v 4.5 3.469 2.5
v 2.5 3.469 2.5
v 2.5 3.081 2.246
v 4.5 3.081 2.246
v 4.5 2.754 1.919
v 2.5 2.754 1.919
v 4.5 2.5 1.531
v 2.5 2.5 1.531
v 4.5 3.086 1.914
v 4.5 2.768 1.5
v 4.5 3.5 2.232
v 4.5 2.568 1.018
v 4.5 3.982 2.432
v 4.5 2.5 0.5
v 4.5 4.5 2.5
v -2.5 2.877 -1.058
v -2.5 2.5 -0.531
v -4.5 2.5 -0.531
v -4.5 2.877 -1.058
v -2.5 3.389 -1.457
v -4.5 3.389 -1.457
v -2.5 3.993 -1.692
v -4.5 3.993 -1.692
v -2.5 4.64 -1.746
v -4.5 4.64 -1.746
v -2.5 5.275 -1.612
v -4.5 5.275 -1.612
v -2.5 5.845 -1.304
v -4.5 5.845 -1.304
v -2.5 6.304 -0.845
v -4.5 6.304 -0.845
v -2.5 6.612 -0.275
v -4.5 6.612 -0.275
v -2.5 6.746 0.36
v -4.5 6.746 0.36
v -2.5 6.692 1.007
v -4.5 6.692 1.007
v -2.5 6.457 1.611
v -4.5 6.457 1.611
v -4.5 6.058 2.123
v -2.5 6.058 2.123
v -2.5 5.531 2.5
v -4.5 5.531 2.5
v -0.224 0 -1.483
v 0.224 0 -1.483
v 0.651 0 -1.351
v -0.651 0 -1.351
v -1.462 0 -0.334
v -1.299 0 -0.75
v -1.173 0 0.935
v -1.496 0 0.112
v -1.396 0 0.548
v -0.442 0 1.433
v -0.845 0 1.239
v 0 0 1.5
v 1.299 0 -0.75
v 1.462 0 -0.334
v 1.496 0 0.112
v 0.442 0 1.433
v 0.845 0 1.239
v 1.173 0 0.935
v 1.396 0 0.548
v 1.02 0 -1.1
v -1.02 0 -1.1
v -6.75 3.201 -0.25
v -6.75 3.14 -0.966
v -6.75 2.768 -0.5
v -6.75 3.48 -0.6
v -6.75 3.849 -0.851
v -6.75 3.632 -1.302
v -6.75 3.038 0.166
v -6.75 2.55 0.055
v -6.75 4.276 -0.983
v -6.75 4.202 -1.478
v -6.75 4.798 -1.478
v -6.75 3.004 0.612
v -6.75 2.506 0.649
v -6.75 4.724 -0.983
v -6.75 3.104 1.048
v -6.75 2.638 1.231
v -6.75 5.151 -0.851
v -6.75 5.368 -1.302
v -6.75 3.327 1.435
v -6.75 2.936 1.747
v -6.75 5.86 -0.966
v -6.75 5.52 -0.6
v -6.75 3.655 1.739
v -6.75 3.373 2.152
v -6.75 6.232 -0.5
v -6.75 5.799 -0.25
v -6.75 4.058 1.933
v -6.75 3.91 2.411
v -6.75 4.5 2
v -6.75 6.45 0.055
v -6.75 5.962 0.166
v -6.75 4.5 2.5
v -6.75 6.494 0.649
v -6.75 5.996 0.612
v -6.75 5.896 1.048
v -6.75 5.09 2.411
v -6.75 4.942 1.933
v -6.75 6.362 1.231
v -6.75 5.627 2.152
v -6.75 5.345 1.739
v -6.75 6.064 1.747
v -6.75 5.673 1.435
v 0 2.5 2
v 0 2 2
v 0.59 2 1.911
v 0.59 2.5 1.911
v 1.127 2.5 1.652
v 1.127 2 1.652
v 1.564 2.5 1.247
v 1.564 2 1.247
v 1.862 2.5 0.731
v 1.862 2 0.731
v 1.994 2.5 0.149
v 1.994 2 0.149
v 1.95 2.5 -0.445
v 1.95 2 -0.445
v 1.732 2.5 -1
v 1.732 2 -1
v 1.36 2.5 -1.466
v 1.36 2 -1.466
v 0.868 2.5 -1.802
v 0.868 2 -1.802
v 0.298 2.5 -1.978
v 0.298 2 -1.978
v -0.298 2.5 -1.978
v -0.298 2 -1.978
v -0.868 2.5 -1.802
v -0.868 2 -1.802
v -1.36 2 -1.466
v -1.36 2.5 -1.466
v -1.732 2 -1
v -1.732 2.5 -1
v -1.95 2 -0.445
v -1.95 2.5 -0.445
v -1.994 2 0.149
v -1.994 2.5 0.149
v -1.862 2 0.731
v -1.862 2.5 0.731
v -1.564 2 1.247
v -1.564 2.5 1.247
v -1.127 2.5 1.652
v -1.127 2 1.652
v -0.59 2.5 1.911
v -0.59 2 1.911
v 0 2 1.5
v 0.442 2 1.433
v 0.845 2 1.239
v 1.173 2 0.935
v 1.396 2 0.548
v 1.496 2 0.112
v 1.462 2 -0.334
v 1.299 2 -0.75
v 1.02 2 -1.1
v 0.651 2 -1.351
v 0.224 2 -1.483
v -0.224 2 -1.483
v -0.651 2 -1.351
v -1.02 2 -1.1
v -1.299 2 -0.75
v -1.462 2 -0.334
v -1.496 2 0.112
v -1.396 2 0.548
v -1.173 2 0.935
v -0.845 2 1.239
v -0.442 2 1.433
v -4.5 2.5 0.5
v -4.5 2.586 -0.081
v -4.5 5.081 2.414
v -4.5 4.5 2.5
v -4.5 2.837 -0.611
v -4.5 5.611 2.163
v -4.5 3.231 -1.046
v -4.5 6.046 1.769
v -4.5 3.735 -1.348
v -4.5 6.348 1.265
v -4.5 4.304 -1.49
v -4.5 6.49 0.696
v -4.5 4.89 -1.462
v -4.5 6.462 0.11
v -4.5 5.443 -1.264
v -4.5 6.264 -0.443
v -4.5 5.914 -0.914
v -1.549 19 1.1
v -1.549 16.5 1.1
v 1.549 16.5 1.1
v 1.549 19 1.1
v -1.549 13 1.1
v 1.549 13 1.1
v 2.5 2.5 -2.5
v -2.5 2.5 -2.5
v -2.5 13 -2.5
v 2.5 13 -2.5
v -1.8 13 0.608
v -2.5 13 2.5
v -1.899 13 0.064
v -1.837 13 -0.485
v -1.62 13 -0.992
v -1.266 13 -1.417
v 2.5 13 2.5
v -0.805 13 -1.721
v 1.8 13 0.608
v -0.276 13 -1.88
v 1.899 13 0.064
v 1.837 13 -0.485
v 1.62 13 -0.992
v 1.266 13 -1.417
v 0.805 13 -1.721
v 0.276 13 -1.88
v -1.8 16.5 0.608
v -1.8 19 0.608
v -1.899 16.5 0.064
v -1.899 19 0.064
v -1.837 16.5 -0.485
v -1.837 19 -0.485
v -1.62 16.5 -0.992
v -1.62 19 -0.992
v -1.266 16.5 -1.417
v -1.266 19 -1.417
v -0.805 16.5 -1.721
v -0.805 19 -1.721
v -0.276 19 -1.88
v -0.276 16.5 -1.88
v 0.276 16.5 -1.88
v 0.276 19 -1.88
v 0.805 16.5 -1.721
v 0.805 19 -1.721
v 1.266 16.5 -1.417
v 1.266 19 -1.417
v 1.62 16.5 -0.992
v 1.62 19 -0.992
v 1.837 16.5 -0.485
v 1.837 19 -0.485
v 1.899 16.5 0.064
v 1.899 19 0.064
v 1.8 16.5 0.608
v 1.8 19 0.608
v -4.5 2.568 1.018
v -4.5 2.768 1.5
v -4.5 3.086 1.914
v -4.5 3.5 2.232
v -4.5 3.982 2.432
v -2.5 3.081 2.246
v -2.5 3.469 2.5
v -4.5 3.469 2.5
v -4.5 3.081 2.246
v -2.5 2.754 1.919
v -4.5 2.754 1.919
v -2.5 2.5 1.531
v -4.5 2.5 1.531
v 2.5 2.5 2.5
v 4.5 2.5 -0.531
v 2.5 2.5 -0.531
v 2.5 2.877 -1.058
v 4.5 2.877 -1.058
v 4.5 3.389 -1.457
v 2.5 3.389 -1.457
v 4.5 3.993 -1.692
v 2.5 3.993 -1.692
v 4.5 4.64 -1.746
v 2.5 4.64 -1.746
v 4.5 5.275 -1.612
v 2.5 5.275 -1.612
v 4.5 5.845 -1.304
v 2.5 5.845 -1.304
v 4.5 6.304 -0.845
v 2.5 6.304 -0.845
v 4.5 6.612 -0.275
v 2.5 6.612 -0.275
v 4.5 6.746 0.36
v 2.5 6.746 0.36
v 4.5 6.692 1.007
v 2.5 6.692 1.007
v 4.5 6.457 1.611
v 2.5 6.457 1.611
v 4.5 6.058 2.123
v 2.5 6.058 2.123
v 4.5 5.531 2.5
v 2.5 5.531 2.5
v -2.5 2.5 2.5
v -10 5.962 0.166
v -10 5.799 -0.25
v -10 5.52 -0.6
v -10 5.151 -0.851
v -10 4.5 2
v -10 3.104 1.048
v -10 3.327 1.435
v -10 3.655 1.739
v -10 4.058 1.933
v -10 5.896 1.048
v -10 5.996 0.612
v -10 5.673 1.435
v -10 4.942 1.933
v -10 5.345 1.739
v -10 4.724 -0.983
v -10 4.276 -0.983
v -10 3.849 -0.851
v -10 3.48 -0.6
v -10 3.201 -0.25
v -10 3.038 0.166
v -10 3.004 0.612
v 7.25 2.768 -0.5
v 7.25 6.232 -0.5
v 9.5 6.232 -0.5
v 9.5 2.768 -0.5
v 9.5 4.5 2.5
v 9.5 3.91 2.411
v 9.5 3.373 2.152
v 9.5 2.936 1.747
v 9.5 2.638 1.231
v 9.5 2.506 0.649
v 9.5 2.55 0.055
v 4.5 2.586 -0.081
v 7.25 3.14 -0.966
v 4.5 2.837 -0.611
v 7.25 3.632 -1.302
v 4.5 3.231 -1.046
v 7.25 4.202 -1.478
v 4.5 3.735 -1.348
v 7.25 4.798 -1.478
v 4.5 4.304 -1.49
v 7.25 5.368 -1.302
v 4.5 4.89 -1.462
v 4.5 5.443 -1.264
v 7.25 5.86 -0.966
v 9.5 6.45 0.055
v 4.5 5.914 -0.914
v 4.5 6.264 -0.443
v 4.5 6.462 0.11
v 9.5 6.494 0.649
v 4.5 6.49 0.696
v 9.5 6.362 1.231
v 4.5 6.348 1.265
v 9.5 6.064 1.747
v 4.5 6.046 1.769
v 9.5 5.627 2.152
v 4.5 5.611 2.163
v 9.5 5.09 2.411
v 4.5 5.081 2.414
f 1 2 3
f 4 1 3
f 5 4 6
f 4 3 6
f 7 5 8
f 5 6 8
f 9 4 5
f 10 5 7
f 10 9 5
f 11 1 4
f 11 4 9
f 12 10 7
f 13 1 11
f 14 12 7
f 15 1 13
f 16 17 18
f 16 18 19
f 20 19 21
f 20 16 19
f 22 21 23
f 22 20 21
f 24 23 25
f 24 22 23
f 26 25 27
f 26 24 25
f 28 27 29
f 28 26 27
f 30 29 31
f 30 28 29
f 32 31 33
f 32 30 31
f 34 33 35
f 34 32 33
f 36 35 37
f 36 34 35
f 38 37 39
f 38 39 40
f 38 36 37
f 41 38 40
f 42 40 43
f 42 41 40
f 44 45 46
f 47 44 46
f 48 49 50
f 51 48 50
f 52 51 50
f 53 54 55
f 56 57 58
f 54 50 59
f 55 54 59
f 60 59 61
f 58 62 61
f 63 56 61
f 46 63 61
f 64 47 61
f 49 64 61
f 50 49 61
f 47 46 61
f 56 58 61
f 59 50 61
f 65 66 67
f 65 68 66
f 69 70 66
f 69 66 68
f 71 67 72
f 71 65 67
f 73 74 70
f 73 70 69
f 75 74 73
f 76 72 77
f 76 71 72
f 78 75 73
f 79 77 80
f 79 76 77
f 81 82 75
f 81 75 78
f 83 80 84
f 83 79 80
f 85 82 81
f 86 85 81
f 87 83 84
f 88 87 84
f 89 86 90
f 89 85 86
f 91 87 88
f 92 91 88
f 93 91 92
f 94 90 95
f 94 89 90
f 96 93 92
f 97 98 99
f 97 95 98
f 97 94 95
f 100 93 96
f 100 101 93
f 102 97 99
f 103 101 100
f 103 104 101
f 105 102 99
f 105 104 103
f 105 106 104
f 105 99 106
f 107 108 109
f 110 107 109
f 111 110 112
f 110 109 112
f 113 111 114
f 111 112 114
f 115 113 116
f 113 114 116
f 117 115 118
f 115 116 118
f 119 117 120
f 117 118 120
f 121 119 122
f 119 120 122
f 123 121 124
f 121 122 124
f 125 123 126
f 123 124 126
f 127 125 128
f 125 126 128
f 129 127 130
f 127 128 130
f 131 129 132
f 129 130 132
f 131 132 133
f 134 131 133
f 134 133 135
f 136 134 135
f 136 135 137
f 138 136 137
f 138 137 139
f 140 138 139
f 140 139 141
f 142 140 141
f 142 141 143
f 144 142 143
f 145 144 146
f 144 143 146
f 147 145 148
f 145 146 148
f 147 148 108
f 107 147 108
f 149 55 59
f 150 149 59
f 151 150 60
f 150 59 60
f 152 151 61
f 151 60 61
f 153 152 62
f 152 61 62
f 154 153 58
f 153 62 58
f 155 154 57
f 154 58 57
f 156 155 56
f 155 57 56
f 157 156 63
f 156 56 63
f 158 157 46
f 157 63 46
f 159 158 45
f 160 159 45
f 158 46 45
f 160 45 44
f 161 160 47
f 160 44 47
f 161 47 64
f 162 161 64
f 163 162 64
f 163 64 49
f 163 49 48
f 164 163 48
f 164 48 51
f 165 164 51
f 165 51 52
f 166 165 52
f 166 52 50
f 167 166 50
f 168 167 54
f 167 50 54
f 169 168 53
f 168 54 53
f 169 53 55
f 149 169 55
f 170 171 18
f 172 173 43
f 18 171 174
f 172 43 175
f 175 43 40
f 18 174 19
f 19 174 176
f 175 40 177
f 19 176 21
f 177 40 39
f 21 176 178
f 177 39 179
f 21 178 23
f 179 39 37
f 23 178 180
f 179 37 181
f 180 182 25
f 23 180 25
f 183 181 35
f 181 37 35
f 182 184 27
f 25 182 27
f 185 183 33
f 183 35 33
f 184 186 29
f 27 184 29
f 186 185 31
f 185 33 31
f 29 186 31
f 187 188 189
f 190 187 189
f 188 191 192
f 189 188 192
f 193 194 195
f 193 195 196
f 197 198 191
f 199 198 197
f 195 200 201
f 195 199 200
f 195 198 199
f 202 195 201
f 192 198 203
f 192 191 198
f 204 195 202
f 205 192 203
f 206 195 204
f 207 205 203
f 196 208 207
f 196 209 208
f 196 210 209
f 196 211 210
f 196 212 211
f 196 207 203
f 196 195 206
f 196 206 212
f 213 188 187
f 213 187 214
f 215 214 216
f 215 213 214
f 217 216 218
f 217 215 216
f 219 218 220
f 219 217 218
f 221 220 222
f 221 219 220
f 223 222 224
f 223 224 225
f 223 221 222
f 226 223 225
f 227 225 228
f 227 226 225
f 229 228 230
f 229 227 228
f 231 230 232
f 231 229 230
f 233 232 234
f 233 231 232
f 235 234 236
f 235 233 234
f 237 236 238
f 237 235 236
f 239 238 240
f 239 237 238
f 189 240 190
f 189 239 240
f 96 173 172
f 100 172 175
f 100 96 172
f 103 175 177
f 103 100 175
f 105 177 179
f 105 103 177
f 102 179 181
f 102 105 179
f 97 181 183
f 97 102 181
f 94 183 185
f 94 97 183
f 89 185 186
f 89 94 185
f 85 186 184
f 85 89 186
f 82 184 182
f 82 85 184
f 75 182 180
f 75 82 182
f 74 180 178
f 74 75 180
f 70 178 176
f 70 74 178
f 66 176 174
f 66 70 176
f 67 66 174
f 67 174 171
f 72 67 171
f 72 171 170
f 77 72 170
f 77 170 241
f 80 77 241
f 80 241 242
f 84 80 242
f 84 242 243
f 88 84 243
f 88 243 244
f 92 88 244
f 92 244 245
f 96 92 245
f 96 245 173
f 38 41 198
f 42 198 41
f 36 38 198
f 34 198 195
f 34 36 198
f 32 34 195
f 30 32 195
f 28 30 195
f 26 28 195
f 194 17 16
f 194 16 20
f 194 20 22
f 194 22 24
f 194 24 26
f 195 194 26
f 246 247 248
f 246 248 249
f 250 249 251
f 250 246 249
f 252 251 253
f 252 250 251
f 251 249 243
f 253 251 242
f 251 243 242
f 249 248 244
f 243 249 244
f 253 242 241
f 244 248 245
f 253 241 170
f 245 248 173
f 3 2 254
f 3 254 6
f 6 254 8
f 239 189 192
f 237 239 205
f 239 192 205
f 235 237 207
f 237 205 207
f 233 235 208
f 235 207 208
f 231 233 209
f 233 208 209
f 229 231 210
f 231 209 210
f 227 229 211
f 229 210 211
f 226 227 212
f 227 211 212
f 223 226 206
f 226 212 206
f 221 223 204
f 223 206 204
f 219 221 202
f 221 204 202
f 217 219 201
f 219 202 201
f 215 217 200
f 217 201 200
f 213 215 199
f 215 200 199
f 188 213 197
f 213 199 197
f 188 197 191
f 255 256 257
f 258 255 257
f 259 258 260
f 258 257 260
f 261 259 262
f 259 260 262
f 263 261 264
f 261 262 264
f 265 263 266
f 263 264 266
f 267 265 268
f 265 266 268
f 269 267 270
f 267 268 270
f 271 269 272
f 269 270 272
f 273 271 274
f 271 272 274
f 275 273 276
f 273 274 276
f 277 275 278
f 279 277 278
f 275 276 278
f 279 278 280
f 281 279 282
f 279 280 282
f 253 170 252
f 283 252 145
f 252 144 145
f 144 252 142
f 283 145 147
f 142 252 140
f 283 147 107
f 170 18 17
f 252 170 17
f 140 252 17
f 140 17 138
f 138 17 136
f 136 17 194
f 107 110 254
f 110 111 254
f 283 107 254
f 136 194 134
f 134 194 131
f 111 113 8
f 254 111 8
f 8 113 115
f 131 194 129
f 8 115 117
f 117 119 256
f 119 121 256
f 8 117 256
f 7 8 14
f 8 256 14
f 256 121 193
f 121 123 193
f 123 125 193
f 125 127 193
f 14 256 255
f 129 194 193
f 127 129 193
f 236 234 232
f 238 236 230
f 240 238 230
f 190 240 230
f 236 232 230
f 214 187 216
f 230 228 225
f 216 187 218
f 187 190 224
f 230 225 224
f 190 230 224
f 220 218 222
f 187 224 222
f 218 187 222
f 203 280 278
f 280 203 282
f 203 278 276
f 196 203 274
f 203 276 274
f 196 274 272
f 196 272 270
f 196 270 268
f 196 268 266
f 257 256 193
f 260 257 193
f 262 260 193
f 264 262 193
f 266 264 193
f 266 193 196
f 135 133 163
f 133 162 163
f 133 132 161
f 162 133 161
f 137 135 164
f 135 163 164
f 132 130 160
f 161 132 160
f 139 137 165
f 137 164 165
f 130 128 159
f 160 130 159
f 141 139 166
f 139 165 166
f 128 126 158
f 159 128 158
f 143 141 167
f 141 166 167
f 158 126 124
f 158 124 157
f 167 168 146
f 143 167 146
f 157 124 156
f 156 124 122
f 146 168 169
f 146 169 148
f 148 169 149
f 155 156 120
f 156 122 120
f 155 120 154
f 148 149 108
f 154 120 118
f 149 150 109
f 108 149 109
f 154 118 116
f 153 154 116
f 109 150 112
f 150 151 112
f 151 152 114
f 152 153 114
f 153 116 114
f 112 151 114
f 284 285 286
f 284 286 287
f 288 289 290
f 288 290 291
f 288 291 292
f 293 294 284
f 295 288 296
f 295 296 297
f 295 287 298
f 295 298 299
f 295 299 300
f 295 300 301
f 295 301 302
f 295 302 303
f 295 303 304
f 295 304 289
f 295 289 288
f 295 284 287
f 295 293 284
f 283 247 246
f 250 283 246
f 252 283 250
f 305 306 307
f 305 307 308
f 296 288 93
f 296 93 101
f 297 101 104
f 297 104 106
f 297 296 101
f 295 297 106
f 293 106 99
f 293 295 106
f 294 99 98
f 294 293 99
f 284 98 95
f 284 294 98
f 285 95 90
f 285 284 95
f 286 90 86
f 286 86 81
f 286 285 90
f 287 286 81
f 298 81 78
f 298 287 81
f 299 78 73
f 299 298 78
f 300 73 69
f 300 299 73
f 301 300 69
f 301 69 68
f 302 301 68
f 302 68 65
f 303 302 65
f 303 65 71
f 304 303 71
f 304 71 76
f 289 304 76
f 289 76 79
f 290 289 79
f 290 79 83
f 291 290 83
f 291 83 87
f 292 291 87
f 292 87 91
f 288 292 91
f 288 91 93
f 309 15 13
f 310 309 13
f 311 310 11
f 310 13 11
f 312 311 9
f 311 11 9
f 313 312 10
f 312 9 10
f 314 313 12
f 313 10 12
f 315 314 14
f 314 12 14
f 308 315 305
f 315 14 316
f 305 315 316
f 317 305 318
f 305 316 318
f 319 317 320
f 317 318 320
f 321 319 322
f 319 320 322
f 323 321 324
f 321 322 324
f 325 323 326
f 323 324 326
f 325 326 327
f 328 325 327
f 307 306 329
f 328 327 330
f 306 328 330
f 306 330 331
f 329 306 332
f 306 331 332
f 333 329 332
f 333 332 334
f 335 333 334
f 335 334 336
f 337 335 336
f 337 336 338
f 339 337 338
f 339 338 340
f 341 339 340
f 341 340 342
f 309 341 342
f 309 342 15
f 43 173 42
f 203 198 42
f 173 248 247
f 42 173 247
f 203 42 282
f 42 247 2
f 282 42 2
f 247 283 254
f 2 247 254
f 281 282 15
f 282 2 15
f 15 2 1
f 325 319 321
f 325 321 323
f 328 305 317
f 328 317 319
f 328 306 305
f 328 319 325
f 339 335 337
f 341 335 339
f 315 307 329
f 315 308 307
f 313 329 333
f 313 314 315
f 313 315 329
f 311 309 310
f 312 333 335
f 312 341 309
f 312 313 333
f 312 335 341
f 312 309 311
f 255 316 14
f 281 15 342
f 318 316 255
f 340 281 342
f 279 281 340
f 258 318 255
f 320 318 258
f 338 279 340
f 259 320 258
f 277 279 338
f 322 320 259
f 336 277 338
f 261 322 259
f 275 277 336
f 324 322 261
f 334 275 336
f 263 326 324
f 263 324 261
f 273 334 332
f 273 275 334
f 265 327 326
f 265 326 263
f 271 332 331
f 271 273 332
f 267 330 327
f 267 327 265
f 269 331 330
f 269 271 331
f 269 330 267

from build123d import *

# Parameters (mm, degrees)
SKETCH1_R            = 1.5
BOSS_EXTRUDE1_DEPTH  = 2
SKETCH2_R            = 2
BOSS_EXTRUDE2_DEPTH  = 0.5
SKETCH3_W            = 5
SKETCH3_H            = 5
BOSS_EXTRUDE3_DEPTH  = 10.5
SKETCH4_R            = 1.9
BOSS_EXTRUDE4_DEPTH  = 3.5
BOSS_EXTRUDE5_DEPTH  = 2.5
BOSS_EXTRUDE9_DEPTH  = 2
SKETCH8_R            = 2
BOSS_EXTRUDE10_DEPTH = 5
BOSS_EXTRUDE12_START = -3.5
BOSS_EXTRUDE12_DEPTH = 3.5
CUT_EXTRUDE1_START   = -3.5
CUT_EXTRUDE1_DEPTH   = 3.5
CUT_EXTRUDE4_START   = -2.25
CUT_EXTRUDE4_DEPTH   = 2.25
SKETCH14_R           = 2
SKETCH14_R_2         = 1.5
CUT_EXTRUDE5_DEPTH   = 3.25
BOSS_EXTRUDE13_START = 0.5
SKETCH15_R           = 2
SKETCH15_R_2         = 1.5
BOSS_EXTRUDE13_DEPTH = 0.5
BOSS_EXTRUDE14_START = 0.5
SKETCH17_R           = 1.5
BOSS_EXTRUDE14_DEPTH = 0.5


# Read off the part's stored shape, not the designer's step: Cut-Extrude4
with BuildPart() as part:
    # Sketch1 → Boss-Extrude1 (new body)
    with BuildSketch(Plane(origin=(0, 0, 0), x_dir=(1, 0, 0), z_dir=(0, 1, 0))):
        with Locations(Location((0, 0, 0), (0, 0, 270))):
            Circle(SKETCH1_R)
    extrude(amount=BOSS_EXTRUDE1_DEPTH)

    # Sketch2 → Boss-Extrude2 (add)
    with BuildSketch(Plane(origin=(0, 2, 0), x_dir=(1, 0, 0), z_dir=(0, 1, 0))):
        with Locations(Location((0, 0, 0), (0, 0, 270))):
            Circle(SKETCH2_R)
    extrude(amount=BOSS_EXTRUDE2_DEPTH)

    # Sketch3 → Boss-Extrude3 (add)
    with BuildSketch(Plane(origin=(0, 2.5, 0), x_dir=(1, 0, 0), z_dir=(0, 1, 0))):
        Rectangle(SKETCH3_W, SKETCH3_H)
    extrude(amount=BOSS_EXTRUDE3_DEPTH)

    # Sketch4 → Boss-Extrude4 (add)
    with BuildSketch(Plane(origin=(0, 13, 0), x_dir=(1, 0, 0), z_dir=(0, 1, 0))):
        with Locations(Location((0, 0, 0), (0, 0, 270))):
            Circle(SKETCH4_R)
    extrude(amount=BOSS_EXTRUDE4_DEPTH)

    # Sketch5 → Boss-Extrude5 (add)
    with BuildSketch(Plane(origin=(0, 16.5, 0), x_dir=(1, 0, 0), z_dir=(0, 1, 0))):
        with BuildLine():
            Line((1.549193338, -1.1), (-1.549193338, -1.1))
            ThreePointArc((-1.549193338, -1.1), (0, 1.9), (1.549193338, -1.1))
        make_face()
    extrude(amount=BOSS_EXTRUDE5_DEPTH)

    # Sketch7 → Boss-Extrude9 (add)
    with BuildSketch(Plane(origin=(2.5, 0, 0), x_dir=(0, 0, -1), z_dir=(1, 0, 0))):
        with BuildLine():
            ThreePointArc((-2.5, 3.469223594), (-2.090990258, 2.909009742), (-1.530776406, 2.5))
            Line((-1.530776406, 2.5), (0.530776406, 2.5))
            ThreePointArc((0.530776406, 2.5), (1.090990258, 6.090990258), (-2.5, 5.530776406))
            Line((-2.5, 5.530776406), (-2.5, 3.469223594))
        make_face()
    boss_extrude9 = extrude(amount=BOSS_EXTRUDE9_DEPTH)

    # Sketch8 → Boss-Extrude10 (add)
    with BuildSketch(Plane(origin=(4.5, 0, 0), x_dir=(0, 0, -1), z_dir=(1, 0, 0))):
        with Locations(Location((-0.5, 4.5, 0), (0, 0, 180))):
            Circle(SKETCH8_R)
    boss_extrude10 = extrude(amount=BOSS_EXTRUDE10_DEPTH)

    # Mirror1: Boss-Extrude9, Boss-Extrude10 across plane
    add(boss_extrude9.mirror(Plane(origin=(0, 0, 0), x_dir=(0, 0, 1), z_dir=(1, 0, 0))))
    add(boss_extrude10.mirror(Plane(origin=(0, 0, 0), x_dir=(0, 0, 1), z_dir=(1, 0, 0))))

    # Sketch10 → Boss-Extrude12 (add)
    with BuildSketch(Plane(origin=(0, 16.5, 0), x_dir=(1, 0, 0), z_dir=(0, 1, 0)).offset(BOSS_EXTRUDE12_START)):
        with BuildLine():
            ThreePointArc((-1.549193338, -1.1), (0, -1.9), (1.549193338, -1.1))
            Line((1.549193338, -1.1), (-1.549193338, -1.1))
        make_face()
    extrude(amount=BOSS_EXTRUDE12_DEPTH)

    # Sketch11 → Cut-Extrude1 (cut)
    with BuildSketch(Plane(origin=(0, 16.5, 0), x_dir=(1, 0, 0), z_dir=(0, 1, 0)).offset(CUT_EXTRUDE1_START)):
        with BuildLine():
            Line((-1.549193338, -1.1), (1.549193338, -1.1))
            ThreePointArc((1.549193338, -1.1), (0, -1.9), (-1.549193338, -1.1))
        make_face()
    extrude(amount=CUT_EXTRUDE1_DEPTH, mode=Mode.SUBTRACT)

    # Cut-Extrude4 outline → Cut-Extrude4 (cut)
    with BuildSketch(Plane(origin=(9.5, 0, 0), x_dir=(0, 0, -1), z_dir=(1, 0, 0)).offset(CUT_EXTRUDE4_START)):
        with BuildLine():
            ThreePointArc((0.5, 2.767949192), (1.5, 4.5), (0.5, 6.232050808))
            Line((0.5, 6.232050808), (0.5, 2.767949192))
        make_face()
    extrude(amount=CUT_EXTRUDE4_DEPTH, mode=Mode.SUBTRACT)

    # Sketch14 → Cut-Extrude5 (cut)
    with BuildSketch(Plane.ZY.offset(9.5)):
        with Locations((0.5, 4.5)):
            Circle(SKETCH14_R)
        with Locations((0.5, 4.5)):
            Circle(SKETCH14_R_2, mode=Mode.SUBTRACT)
    extrude(amount=-CUT_EXTRUDE5_DEPTH, mode=Mode.SUBTRACT)

    # Sketch15 → Boss-Extrude13 (add)
    with BuildSketch(Plane.ZY.offset(6.25).offset(BOSS_EXTRUDE13_START)):
        with Locations((0.5, 4.5)):
            Circle(SKETCH15_R)
        with Locations((0.5, 4.5)):
            Circle(SKETCH15_R_2, mode=Mode.SUBTRACT)
    extrude(amount=-BOSS_EXTRUDE13_DEPTH)

    # Sketch17 → Boss-Extrude14 (add)
    with BuildSketch(Plane.ZY.offset(9.5).offset(BOSS_EXTRUDE14_START)):
        with Locations((0.5, 4.5)):
            Circle(SKETCH17_R)
    extrude(amount=-BOSS_EXTRUDE14_DEPTH)


solid = part.part
